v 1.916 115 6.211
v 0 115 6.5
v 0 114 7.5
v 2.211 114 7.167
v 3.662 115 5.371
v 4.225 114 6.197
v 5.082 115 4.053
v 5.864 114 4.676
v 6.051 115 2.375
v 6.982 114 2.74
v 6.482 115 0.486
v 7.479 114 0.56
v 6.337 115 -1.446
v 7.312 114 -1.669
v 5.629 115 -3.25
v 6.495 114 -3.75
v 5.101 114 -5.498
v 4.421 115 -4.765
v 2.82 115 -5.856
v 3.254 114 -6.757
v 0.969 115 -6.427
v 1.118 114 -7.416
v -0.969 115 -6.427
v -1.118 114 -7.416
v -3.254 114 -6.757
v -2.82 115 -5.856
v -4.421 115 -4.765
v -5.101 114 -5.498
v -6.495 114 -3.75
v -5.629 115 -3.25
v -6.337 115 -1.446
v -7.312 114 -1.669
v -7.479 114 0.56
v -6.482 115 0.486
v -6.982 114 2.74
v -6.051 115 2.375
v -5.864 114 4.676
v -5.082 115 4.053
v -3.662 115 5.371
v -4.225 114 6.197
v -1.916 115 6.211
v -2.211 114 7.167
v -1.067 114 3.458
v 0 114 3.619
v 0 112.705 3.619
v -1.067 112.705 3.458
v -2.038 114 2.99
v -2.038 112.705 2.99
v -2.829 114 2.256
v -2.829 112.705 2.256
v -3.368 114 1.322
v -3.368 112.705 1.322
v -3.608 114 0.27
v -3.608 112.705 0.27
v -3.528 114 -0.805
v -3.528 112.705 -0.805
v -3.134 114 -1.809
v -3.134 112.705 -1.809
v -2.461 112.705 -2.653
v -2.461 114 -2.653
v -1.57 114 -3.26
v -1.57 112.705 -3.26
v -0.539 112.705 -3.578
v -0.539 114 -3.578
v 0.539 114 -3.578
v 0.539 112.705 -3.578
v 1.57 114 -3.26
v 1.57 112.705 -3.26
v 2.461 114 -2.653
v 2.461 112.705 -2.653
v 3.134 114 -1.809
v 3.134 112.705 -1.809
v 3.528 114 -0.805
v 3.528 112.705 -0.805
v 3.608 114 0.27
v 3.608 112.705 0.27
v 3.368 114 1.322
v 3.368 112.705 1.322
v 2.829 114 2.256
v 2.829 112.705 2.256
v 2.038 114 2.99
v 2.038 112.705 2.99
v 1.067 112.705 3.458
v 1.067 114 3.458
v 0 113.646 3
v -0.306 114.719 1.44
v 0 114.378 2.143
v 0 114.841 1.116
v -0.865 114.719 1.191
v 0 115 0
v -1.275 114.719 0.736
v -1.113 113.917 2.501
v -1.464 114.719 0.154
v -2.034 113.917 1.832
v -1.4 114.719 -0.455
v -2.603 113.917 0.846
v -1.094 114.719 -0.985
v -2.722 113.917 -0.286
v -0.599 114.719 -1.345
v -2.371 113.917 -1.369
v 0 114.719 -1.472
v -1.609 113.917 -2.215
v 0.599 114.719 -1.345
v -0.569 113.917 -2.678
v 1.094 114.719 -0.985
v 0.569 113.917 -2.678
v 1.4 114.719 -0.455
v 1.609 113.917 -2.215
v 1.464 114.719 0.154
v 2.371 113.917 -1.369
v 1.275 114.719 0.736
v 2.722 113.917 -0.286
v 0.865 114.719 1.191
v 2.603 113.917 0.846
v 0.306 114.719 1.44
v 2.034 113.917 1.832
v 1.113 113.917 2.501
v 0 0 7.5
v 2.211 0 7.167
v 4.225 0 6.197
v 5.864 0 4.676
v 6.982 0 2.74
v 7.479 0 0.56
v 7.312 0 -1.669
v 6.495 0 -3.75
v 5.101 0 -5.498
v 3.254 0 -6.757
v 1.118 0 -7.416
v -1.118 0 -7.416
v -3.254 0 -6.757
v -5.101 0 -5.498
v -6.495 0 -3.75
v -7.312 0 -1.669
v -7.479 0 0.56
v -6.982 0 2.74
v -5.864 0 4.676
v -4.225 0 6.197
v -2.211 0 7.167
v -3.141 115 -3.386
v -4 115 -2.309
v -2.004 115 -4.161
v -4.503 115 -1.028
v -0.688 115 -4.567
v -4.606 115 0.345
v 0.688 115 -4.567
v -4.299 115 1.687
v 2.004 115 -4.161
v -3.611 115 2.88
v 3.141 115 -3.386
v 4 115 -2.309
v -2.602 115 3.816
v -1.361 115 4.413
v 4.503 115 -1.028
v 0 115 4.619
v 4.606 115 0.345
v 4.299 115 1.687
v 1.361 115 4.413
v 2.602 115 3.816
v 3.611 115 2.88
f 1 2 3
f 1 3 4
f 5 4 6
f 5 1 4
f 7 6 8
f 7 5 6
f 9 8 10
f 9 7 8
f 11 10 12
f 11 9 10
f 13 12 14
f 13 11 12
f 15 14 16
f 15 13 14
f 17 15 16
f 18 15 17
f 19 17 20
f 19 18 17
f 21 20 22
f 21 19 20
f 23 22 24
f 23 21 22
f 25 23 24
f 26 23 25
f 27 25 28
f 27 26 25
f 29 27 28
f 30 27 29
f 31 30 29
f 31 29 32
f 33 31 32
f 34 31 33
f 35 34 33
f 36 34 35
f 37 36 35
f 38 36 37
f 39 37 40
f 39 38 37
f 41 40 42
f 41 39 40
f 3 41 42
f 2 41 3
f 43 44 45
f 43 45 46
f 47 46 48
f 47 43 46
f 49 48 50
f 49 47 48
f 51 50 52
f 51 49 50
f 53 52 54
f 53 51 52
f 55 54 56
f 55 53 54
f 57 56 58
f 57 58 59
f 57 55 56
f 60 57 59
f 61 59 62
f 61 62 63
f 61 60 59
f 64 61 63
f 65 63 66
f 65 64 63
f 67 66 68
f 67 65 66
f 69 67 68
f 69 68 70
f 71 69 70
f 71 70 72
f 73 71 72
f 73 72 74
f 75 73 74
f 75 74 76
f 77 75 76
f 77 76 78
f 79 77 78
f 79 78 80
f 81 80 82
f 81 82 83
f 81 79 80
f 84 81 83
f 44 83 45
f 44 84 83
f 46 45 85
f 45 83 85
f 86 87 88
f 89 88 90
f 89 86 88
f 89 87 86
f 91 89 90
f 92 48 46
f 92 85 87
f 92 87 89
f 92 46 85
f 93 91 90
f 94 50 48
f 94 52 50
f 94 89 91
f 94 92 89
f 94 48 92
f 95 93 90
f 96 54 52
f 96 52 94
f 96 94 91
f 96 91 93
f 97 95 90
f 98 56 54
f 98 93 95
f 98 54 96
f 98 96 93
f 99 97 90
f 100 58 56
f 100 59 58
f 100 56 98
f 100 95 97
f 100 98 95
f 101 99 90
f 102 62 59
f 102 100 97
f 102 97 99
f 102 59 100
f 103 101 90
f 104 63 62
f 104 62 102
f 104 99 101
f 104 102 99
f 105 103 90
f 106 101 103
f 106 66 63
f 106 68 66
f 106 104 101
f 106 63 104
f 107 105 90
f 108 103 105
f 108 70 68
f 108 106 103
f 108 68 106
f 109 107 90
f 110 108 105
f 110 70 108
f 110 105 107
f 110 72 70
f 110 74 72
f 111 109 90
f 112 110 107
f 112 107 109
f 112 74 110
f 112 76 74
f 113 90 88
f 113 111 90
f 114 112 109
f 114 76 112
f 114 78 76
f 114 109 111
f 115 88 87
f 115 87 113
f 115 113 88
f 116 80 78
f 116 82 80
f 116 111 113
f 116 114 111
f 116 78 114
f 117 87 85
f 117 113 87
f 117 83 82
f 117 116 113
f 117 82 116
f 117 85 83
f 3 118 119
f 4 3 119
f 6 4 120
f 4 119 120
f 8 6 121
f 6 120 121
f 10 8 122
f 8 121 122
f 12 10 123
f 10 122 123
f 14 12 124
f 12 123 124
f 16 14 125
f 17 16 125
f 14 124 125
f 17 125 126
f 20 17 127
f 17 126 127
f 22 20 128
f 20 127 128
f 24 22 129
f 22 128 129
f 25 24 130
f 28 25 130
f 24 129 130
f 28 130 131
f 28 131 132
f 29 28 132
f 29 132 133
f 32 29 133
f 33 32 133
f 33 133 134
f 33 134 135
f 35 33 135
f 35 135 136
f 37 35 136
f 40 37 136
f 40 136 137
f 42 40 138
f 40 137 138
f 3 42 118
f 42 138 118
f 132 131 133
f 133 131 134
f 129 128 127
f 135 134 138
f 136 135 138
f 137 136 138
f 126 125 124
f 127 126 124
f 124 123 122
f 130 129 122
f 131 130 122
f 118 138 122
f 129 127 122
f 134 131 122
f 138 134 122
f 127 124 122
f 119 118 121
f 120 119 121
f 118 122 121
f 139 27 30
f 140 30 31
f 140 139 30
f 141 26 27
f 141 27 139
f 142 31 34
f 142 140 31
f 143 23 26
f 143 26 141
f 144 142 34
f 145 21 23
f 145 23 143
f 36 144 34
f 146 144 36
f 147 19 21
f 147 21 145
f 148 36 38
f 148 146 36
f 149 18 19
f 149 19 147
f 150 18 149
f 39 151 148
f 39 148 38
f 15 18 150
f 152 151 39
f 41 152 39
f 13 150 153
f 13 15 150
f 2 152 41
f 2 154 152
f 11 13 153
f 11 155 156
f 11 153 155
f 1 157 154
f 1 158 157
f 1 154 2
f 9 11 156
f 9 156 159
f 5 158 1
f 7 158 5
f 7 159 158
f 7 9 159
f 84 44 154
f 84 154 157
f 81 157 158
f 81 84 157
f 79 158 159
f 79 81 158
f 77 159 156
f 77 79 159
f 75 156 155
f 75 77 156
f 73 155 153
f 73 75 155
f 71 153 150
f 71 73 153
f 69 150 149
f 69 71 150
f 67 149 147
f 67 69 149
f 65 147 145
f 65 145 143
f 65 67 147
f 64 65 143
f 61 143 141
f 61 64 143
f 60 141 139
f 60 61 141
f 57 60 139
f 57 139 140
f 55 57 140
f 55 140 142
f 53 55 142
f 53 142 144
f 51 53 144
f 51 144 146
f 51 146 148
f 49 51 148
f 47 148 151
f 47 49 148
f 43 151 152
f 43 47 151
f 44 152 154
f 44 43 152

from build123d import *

# Parameters (mm, degrees)
SKETCH1_R           = 7.5
BOSS_EXTRUDE1_DEPTH = 115
CHAMFER1_SIZE       = 1


with BuildPart() as part:
    # Sketch1 → Boss-Extrude1 (new body)
    with BuildSketch(Plane(origin=(0, 0, 0), x_dir=(1, 0, 0), z_dir=(0, 1, 0))):
        with Locations(Location((0, 0, 0), (0, 0, 270))):
            Circle(SKETCH1_R)
    extrude(amount=BOSS_EXTRUDE1_DEPTH)

    # Sketch2 → Cut-Revolve1 (revolve, cut)
    with BuildSketch(Plane.XY, mode=Mode.PRIVATE) as cut_revolve1_sk:
        with BuildLine():
            Line((-3.618601574, 112.704618035), (-3.618601574, 116.762708117))
            Line((-3.618601574, 116.762708117), (0, 116.762708117))
            Line((0, 116.762708117), (0, 115))
            ThreePointArc((0, 115), (-2.142606807, 114.37775607), (-3.618601574, 112.704618035))
        make_face()
    revolve(cut_revolve1_sk.sketch.rotate(Axis((0, 125.515236919, 0), (0, -1, 0)), 270), axis=Axis((0, 125.515236919, 0), (0, -1, 0)), mode=Mode.SUBTRACT)

    # Chamfer1
    chamfer1_edges = [part.edges().sort_by_distance(p)[0] for p in [
        (0, 115, -7.5),
        (0, 115, -3.618601574),
    ]]
    chamfer(chamfer1_edges, length=CHAMFER1_SIZE)


solid = part.part
